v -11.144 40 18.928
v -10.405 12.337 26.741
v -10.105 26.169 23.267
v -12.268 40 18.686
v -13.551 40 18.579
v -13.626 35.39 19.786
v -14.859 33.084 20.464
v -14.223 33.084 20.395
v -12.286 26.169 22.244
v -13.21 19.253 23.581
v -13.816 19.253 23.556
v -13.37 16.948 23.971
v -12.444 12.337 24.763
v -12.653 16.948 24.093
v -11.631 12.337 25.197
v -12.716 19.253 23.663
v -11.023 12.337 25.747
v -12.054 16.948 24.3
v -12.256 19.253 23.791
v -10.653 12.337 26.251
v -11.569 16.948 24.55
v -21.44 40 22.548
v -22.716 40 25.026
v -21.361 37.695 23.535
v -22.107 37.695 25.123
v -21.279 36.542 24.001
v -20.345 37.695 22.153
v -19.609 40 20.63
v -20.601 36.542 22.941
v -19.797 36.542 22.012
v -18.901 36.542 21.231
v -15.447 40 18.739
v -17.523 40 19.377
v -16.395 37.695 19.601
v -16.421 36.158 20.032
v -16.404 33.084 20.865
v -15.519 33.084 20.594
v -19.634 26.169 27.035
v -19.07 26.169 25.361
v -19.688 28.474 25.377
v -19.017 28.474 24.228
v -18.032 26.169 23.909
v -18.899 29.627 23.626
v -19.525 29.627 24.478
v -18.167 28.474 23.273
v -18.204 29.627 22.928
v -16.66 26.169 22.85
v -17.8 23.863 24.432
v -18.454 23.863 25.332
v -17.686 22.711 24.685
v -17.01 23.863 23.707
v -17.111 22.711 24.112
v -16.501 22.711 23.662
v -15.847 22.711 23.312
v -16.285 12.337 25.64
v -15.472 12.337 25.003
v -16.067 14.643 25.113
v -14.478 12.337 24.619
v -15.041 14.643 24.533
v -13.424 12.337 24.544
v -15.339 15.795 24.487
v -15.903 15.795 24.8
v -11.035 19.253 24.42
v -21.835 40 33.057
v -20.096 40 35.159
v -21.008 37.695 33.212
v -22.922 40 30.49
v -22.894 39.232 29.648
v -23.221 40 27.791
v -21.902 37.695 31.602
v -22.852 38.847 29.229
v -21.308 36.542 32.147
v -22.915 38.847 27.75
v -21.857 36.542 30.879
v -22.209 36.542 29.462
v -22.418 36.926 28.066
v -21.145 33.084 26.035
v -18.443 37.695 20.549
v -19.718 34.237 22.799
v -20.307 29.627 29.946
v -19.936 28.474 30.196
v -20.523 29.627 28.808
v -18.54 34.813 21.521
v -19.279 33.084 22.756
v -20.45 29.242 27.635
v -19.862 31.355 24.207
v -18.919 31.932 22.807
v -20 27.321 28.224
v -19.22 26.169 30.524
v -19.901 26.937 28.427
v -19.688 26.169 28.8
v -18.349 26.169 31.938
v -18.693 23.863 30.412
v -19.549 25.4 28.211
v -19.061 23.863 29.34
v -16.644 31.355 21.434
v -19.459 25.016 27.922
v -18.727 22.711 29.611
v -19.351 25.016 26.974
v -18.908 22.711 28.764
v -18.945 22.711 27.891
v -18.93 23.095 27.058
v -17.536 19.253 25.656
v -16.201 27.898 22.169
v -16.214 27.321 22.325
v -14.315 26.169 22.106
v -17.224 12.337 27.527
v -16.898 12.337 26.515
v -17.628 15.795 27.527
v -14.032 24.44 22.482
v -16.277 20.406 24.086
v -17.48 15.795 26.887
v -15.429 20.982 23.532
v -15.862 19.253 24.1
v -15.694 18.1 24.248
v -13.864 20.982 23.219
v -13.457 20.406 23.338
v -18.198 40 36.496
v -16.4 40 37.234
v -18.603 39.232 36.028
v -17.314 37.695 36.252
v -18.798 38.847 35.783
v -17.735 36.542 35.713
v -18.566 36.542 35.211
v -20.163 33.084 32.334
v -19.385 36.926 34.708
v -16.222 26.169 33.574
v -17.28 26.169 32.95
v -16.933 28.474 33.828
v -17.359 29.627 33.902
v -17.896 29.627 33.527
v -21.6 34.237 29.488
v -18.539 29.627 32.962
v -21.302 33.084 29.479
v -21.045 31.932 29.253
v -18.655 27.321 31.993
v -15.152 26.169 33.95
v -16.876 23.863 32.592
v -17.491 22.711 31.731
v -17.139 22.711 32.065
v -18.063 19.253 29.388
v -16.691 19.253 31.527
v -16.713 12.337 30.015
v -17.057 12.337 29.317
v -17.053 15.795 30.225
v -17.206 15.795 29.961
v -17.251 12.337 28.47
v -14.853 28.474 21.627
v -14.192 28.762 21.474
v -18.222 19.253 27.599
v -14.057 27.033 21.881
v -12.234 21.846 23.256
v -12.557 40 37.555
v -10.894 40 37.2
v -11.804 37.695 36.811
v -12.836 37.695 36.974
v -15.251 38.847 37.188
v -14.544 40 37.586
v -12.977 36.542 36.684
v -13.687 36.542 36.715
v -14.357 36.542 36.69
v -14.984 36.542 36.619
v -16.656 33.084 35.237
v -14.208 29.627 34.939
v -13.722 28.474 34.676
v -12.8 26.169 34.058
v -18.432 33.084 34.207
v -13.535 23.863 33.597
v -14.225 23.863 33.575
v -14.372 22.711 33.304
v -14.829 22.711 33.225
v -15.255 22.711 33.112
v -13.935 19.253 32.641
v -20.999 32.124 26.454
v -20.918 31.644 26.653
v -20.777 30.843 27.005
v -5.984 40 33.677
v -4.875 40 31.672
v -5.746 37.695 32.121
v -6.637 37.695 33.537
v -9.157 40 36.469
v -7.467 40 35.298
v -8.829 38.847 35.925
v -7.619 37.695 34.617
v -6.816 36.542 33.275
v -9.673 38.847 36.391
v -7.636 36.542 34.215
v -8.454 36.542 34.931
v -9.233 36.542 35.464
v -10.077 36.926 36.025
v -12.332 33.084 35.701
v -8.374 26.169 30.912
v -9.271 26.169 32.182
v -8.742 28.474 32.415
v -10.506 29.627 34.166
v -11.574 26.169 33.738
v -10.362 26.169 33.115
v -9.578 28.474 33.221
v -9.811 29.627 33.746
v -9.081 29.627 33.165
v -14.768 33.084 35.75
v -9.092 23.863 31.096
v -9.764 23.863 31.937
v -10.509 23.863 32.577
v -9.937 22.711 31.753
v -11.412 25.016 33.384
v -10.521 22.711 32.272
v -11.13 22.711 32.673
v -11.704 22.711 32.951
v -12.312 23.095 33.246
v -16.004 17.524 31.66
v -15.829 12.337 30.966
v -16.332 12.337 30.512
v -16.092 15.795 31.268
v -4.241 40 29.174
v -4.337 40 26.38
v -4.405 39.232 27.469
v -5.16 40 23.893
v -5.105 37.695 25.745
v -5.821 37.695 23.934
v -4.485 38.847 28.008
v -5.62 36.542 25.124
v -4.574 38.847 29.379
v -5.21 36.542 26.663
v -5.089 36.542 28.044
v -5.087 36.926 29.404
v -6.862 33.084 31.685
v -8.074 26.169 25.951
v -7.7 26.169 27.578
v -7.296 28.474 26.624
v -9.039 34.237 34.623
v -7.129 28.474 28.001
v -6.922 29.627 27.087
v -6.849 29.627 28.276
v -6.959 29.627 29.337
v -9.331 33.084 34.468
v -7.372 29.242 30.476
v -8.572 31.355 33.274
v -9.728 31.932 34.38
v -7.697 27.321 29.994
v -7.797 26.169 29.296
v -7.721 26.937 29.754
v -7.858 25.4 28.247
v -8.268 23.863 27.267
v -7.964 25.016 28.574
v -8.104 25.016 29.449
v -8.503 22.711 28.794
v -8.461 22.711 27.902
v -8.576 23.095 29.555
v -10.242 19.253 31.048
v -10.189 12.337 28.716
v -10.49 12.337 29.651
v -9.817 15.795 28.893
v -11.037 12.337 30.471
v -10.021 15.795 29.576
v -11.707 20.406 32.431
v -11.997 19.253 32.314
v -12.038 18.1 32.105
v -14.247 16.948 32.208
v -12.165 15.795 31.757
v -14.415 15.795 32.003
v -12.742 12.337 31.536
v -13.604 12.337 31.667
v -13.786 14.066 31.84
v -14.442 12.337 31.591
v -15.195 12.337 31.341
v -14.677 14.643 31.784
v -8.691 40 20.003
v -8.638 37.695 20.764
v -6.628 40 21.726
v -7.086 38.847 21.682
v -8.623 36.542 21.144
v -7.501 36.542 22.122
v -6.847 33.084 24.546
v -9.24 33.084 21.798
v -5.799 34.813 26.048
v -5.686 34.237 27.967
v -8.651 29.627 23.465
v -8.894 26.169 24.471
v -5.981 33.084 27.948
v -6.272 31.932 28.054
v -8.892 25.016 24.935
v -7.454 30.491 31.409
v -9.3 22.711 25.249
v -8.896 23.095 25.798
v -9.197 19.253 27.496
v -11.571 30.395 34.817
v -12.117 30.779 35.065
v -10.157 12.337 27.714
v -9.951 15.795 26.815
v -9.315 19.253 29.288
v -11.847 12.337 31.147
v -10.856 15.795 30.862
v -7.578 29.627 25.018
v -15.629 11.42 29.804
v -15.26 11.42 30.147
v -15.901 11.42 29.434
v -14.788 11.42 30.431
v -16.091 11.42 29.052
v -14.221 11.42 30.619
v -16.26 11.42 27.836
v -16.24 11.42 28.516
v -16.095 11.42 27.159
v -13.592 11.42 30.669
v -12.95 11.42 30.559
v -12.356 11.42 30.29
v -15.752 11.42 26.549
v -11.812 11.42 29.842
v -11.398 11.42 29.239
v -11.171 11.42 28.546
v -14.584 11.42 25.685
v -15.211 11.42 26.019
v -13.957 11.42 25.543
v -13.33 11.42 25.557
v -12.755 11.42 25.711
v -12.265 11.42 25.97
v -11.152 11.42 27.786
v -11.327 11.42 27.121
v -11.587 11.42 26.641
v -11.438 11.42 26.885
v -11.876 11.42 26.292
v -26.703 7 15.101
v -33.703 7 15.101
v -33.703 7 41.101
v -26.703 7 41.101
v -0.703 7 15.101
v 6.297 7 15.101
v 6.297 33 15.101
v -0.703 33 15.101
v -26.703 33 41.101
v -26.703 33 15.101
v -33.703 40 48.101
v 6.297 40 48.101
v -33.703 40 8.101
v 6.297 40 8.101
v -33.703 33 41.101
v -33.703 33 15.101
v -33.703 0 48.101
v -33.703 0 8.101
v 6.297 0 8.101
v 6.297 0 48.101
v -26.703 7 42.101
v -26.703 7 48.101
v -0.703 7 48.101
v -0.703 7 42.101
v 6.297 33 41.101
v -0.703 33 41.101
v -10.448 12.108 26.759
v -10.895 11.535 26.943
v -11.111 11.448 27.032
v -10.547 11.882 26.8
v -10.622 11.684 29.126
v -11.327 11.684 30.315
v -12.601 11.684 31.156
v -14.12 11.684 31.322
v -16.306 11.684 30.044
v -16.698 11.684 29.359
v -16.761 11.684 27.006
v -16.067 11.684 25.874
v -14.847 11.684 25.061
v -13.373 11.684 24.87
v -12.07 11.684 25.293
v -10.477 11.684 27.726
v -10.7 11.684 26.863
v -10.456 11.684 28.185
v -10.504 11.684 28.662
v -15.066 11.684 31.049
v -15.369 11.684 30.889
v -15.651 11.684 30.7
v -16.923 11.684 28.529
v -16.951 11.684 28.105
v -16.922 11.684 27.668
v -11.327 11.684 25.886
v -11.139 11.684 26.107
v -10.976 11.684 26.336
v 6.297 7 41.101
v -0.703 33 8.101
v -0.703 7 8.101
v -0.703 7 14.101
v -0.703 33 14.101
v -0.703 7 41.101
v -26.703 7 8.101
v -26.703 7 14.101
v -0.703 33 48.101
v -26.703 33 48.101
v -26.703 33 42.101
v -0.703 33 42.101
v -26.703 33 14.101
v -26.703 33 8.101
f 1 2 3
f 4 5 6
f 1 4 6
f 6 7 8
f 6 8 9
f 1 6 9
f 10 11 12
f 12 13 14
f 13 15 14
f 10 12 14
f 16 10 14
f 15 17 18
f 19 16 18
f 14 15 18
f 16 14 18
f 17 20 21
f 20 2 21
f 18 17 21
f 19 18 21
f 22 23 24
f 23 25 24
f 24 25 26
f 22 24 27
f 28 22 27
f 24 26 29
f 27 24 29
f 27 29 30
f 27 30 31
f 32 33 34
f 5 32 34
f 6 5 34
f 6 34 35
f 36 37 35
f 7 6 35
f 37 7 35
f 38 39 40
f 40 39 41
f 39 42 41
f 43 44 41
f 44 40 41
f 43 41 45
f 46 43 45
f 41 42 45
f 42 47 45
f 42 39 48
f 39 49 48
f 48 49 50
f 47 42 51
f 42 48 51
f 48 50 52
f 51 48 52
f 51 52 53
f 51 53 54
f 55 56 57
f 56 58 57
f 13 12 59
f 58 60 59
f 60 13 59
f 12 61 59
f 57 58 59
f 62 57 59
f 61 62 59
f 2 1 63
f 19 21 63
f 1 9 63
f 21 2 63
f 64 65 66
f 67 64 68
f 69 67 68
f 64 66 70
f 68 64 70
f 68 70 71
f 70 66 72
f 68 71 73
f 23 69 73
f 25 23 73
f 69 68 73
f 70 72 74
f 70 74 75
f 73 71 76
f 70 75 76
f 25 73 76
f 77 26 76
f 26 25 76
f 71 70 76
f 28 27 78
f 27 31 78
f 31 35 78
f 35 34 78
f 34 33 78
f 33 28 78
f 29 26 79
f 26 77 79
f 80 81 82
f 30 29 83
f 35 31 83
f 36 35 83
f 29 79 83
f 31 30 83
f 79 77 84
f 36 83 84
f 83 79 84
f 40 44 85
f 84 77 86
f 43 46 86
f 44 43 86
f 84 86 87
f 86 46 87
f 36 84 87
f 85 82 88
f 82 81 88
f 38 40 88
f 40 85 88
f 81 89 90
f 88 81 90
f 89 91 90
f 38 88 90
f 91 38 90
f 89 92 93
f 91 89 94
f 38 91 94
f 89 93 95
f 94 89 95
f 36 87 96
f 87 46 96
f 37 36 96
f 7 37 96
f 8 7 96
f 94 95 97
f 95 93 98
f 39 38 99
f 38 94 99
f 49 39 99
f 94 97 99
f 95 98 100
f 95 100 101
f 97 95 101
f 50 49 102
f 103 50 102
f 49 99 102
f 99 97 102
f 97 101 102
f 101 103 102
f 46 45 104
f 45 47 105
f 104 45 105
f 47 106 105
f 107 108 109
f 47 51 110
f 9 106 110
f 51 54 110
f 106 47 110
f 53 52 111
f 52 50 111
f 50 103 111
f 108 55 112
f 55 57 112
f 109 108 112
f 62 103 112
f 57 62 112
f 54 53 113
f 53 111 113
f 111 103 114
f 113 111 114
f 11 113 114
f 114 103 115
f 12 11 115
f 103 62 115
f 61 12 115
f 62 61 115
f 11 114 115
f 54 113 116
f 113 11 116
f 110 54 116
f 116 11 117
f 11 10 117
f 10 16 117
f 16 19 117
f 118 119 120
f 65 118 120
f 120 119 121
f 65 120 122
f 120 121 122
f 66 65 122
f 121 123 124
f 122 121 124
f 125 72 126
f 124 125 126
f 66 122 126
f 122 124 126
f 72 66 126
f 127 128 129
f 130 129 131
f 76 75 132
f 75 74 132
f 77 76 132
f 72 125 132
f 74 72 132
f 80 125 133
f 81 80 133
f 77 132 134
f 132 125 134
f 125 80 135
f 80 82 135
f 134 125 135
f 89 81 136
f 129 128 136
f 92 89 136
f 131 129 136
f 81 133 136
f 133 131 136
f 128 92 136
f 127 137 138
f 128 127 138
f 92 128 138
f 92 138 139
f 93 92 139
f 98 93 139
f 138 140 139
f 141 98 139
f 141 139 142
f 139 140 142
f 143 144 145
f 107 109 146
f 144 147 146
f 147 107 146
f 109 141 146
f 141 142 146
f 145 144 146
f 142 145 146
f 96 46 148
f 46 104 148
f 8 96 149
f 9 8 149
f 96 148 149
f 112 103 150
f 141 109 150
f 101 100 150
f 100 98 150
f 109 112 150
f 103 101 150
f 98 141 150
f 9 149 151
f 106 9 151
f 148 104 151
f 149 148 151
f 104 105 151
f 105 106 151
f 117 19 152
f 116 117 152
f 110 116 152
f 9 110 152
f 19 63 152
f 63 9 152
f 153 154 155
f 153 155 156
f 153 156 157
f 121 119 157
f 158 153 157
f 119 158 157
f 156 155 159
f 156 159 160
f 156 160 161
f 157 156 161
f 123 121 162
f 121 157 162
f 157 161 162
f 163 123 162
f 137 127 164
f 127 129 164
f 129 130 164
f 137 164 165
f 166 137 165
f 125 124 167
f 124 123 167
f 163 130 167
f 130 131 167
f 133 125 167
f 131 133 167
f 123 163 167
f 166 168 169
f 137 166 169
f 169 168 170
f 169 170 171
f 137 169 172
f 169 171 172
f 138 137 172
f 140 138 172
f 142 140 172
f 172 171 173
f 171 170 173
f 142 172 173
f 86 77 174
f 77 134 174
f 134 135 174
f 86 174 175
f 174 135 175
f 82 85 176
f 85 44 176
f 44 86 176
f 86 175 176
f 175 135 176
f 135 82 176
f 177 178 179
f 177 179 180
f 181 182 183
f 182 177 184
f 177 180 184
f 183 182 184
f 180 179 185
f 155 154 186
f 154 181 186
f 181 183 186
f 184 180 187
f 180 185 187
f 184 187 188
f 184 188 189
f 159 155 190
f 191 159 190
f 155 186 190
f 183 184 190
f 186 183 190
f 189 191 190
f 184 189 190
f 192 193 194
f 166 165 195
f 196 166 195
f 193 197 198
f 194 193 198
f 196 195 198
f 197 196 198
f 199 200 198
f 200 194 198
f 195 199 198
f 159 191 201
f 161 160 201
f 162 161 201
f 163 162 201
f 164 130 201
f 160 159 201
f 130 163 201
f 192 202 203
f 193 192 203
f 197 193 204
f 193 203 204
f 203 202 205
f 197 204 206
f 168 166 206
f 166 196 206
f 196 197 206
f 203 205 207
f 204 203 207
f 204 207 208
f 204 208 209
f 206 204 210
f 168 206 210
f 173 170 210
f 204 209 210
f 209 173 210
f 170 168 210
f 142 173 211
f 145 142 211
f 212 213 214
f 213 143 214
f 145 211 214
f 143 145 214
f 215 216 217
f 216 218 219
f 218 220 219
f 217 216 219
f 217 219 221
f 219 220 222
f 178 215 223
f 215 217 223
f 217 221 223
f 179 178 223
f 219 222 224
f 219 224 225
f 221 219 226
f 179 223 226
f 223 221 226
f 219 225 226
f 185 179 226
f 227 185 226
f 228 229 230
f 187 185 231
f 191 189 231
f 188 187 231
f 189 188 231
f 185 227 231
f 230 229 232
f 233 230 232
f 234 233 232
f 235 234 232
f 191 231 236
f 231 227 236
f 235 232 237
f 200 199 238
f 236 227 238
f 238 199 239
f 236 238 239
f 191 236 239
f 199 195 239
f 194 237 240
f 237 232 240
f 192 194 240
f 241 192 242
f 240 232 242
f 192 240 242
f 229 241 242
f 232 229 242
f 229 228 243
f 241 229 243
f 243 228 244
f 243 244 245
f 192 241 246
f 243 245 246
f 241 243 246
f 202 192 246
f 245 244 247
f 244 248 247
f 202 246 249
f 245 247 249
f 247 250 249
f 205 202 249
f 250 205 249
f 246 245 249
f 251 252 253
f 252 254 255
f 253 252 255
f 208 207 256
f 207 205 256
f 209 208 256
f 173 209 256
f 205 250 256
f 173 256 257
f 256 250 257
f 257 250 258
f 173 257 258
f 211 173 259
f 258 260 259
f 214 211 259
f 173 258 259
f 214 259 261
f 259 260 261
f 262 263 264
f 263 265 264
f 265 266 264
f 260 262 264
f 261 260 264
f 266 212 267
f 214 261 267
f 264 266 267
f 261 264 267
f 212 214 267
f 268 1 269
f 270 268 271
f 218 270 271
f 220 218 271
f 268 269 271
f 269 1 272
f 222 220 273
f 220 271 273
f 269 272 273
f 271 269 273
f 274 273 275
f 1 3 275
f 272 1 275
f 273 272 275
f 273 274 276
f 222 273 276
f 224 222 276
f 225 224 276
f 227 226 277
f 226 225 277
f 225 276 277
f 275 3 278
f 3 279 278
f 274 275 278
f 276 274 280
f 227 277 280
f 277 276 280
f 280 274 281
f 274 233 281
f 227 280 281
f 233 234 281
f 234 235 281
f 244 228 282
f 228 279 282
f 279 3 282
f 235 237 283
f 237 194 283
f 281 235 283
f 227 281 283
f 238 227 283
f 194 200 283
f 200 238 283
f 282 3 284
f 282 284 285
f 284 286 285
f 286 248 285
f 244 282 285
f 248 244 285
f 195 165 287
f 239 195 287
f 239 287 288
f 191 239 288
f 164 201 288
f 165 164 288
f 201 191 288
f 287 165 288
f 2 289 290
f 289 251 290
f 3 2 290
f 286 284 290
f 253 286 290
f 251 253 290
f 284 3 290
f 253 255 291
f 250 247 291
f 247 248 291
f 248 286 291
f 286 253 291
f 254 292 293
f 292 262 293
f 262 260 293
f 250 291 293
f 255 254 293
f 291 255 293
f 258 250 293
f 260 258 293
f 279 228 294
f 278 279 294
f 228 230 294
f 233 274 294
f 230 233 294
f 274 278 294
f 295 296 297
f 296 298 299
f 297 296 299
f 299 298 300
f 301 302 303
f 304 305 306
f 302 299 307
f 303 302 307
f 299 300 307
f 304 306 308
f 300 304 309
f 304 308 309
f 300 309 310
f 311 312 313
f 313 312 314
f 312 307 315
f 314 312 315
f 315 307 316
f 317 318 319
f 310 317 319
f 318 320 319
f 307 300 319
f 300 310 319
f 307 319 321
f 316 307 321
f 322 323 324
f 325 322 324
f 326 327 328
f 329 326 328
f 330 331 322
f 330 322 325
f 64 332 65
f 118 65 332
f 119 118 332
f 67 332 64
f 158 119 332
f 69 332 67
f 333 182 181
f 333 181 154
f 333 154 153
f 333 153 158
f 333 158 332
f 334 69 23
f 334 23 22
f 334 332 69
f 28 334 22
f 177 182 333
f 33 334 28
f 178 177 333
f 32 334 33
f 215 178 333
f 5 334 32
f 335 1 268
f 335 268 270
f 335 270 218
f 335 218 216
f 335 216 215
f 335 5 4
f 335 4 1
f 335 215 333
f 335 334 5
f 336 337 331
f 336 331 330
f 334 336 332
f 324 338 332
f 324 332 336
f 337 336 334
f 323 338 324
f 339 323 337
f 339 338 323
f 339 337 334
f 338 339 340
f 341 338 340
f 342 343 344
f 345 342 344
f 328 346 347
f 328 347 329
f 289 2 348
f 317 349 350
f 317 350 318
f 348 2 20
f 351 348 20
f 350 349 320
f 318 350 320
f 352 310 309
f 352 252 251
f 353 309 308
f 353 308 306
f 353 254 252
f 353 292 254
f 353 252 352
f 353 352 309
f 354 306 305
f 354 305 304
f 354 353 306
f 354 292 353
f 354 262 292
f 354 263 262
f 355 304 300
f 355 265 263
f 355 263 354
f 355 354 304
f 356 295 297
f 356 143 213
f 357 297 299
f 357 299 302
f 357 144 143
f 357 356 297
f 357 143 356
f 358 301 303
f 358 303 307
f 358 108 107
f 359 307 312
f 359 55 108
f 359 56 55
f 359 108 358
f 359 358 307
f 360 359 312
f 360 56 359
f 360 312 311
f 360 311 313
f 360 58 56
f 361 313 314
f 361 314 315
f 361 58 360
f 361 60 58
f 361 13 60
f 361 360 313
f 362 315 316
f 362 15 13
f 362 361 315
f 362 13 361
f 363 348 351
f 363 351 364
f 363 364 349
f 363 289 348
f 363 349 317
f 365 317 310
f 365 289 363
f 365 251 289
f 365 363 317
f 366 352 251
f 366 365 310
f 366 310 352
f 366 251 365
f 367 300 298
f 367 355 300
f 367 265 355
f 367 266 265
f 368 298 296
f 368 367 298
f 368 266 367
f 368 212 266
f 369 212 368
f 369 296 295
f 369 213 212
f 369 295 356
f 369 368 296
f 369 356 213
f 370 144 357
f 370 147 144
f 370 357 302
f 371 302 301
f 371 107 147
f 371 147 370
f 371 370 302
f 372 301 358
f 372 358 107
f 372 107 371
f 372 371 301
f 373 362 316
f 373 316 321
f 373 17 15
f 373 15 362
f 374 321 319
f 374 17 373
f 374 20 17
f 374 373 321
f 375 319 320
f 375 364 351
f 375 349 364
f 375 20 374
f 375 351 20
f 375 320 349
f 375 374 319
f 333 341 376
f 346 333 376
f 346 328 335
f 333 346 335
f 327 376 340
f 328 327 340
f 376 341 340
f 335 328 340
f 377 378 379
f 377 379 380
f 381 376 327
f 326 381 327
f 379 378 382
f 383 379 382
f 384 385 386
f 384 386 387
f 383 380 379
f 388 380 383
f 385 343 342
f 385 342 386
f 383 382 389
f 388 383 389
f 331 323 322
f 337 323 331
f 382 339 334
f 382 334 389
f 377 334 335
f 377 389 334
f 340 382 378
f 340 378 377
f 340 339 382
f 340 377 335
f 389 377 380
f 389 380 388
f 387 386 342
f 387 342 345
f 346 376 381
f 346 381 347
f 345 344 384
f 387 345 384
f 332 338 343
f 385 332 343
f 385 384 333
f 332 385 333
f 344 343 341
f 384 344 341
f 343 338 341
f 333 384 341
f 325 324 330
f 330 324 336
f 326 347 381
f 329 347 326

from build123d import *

# Parameters (mm, degrees)
ESBO_O1_W                = 40
ESBO_O1_H                = 40
RESSALTO_EXTRUS_O1_DEPTH = 40
FILETE1_R                = 1
ESBO_O10_W               = 26
ESBO_O10_H               = 26
CORTE_EXTRUS_O3_DEPTH    = 7
ESBO_O11_W               = 26
ESBO_O11_H               = 26
CORTE_EXTRUS_O6_DEPTH    = 6
ESBO_O12_W               = 26
ESBO_O12_H               = 26
CORTE_EXTRUS_O7_DEPTH    = 6
ESBO_O13_W               = 26
ESBO_O13_H               = 26
CORTE_EXTRUS_O8_DEPTH    = 7


with BuildPart() as part:
    # Esboço1 → Ressalto-extrusão1 (new body)
    with BuildSketch(Plane(origin=(0, 0, 0), x_dir=(1, 0, 0), z_dir=(0, 1, 0))):
        with Locations((-13.703200382, -28.10068404)):
            Rectangle(ESBO_O1_W, ESBO_O1_H)
    extrude(amount=RESSALTO_EXTRUS_O1_DEPTH)

    # Loft de corte4: read off the stored shape, not the designer's step
    # Loft de corte4: loft between two sections, ruled curve by curve
    loft_de_corte4_from = [
        Edge.make_bspline([(-11.144198007, 40, 18.927950759), (7.201268555, 40, 24.04595551), (2.083263805, 40, 42.391422072), (-16.262202757, 40, 37.273417321), (-34.607669319, 40, 32.155412571), (-29.489664569, 40, 13.809946009), (-11.144198007, 40, 18.927950759)], [0, 0, 0, 0, 0.5, 0.5, 0.5, 1, 1, 1, 1], 3, [1, 0.333333333, 0.333333333, 1, 0.333333333, 0.333333333, 1]),
    ]
    loft_de_corte4_to = [
        Edge.make_bspline([(-10.380671839, 11.42, 27.000318611), (-8.179940979, 11.42, 33.645375697), (-14.824998066, 11.42, 35.846106557), (-17.025728925, 11.42, 29.20104947), (-19.226459785, 11.42, 22.555992384), (-12.581402699, 11.42, 20.355261524), (-10.380671839, 11.42, 27.000318611)], [0, 0, 0, 0, 0.5, 0.5, 0.5, 1, 1, 1, 1], 3, [1, 0.333333333, 0.333333333, 1, 0.333333333, 0.333333333, 1]),
    ]
    loft_de_corte4 = Solid(Shell([*[Face.make_surface_from_curves(loft_de_corte4_from[k], loft_de_corte4_to[k]) for k in range(1)], Face(Wire(loft_de_corte4_from)), Face(Wire(loft_de_corte4_to))]))
    add(loft_de_corte4, mode=Mode.SUBTRACT)

    # Filete1
    filete1_edges = [part.edges().sort_by_distance(p)[0] for p in [
        (-17.025728925, 11.42, 29.20104947),
    ]]
    fillet(filete1_edges, radius=FILETE1_R)

    # Esboço10 → Corte-extrusão3 (cut)
    with BuildSketch(Plane.ZY.offset(33.703200382)):
        with Locations((28.10068404, 20)):
            Rectangle(ESBO_O10_W, ESBO_O10_H)
    extrude(amount=-CORTE_EXTRUS_O3_DEPTH, mode=Mode.SUBTRACT)

    # Esboço11 → Corte-extrusão6 (cut)
    with BuildSketch(Plane(origin=(0, 0, 8.10068404), x_dir=(-1, 0, 0), z_dir=(0, 0, -1))):
        with Locations((13.703200382, 20)):
            Rectangle(ESBO_O11_W, ESBO_O11_H)
    extrude(amount=-CORTE_EXTRUS_O6_DEPTH, mode=Mode.SUBTRACT)

    # Esboço12 → Corte-extrusão7 (cut)
    with BuildSketch(Plane.XY.offset(48.10068404)):
        with Locations((-13.703200382, 20)):
            Rectangle(ESBO_O12_W, ESBO_O12_H)
    extrude(amount=-CORTE_EXTRUS_O7_DEPTH, mode=Mode.SUBTRACT)

    # Esboço13 → Corte-extrusão8 (cut)
    with BuildSketch(Plane(origin=(6.296799618, 0, 0), x_dir=(0, 0, -1), z_dir=(1, 0, 0))):
        with Locations((-28.10068404, 20)):
            Rectangle(ESBO_O13_W, ESBO_O13_H)
    extrude(amount=-CORTE_EXTRUS_O8_DEPTH, mode=Mode.SUBTRACT)


solid = part.part
